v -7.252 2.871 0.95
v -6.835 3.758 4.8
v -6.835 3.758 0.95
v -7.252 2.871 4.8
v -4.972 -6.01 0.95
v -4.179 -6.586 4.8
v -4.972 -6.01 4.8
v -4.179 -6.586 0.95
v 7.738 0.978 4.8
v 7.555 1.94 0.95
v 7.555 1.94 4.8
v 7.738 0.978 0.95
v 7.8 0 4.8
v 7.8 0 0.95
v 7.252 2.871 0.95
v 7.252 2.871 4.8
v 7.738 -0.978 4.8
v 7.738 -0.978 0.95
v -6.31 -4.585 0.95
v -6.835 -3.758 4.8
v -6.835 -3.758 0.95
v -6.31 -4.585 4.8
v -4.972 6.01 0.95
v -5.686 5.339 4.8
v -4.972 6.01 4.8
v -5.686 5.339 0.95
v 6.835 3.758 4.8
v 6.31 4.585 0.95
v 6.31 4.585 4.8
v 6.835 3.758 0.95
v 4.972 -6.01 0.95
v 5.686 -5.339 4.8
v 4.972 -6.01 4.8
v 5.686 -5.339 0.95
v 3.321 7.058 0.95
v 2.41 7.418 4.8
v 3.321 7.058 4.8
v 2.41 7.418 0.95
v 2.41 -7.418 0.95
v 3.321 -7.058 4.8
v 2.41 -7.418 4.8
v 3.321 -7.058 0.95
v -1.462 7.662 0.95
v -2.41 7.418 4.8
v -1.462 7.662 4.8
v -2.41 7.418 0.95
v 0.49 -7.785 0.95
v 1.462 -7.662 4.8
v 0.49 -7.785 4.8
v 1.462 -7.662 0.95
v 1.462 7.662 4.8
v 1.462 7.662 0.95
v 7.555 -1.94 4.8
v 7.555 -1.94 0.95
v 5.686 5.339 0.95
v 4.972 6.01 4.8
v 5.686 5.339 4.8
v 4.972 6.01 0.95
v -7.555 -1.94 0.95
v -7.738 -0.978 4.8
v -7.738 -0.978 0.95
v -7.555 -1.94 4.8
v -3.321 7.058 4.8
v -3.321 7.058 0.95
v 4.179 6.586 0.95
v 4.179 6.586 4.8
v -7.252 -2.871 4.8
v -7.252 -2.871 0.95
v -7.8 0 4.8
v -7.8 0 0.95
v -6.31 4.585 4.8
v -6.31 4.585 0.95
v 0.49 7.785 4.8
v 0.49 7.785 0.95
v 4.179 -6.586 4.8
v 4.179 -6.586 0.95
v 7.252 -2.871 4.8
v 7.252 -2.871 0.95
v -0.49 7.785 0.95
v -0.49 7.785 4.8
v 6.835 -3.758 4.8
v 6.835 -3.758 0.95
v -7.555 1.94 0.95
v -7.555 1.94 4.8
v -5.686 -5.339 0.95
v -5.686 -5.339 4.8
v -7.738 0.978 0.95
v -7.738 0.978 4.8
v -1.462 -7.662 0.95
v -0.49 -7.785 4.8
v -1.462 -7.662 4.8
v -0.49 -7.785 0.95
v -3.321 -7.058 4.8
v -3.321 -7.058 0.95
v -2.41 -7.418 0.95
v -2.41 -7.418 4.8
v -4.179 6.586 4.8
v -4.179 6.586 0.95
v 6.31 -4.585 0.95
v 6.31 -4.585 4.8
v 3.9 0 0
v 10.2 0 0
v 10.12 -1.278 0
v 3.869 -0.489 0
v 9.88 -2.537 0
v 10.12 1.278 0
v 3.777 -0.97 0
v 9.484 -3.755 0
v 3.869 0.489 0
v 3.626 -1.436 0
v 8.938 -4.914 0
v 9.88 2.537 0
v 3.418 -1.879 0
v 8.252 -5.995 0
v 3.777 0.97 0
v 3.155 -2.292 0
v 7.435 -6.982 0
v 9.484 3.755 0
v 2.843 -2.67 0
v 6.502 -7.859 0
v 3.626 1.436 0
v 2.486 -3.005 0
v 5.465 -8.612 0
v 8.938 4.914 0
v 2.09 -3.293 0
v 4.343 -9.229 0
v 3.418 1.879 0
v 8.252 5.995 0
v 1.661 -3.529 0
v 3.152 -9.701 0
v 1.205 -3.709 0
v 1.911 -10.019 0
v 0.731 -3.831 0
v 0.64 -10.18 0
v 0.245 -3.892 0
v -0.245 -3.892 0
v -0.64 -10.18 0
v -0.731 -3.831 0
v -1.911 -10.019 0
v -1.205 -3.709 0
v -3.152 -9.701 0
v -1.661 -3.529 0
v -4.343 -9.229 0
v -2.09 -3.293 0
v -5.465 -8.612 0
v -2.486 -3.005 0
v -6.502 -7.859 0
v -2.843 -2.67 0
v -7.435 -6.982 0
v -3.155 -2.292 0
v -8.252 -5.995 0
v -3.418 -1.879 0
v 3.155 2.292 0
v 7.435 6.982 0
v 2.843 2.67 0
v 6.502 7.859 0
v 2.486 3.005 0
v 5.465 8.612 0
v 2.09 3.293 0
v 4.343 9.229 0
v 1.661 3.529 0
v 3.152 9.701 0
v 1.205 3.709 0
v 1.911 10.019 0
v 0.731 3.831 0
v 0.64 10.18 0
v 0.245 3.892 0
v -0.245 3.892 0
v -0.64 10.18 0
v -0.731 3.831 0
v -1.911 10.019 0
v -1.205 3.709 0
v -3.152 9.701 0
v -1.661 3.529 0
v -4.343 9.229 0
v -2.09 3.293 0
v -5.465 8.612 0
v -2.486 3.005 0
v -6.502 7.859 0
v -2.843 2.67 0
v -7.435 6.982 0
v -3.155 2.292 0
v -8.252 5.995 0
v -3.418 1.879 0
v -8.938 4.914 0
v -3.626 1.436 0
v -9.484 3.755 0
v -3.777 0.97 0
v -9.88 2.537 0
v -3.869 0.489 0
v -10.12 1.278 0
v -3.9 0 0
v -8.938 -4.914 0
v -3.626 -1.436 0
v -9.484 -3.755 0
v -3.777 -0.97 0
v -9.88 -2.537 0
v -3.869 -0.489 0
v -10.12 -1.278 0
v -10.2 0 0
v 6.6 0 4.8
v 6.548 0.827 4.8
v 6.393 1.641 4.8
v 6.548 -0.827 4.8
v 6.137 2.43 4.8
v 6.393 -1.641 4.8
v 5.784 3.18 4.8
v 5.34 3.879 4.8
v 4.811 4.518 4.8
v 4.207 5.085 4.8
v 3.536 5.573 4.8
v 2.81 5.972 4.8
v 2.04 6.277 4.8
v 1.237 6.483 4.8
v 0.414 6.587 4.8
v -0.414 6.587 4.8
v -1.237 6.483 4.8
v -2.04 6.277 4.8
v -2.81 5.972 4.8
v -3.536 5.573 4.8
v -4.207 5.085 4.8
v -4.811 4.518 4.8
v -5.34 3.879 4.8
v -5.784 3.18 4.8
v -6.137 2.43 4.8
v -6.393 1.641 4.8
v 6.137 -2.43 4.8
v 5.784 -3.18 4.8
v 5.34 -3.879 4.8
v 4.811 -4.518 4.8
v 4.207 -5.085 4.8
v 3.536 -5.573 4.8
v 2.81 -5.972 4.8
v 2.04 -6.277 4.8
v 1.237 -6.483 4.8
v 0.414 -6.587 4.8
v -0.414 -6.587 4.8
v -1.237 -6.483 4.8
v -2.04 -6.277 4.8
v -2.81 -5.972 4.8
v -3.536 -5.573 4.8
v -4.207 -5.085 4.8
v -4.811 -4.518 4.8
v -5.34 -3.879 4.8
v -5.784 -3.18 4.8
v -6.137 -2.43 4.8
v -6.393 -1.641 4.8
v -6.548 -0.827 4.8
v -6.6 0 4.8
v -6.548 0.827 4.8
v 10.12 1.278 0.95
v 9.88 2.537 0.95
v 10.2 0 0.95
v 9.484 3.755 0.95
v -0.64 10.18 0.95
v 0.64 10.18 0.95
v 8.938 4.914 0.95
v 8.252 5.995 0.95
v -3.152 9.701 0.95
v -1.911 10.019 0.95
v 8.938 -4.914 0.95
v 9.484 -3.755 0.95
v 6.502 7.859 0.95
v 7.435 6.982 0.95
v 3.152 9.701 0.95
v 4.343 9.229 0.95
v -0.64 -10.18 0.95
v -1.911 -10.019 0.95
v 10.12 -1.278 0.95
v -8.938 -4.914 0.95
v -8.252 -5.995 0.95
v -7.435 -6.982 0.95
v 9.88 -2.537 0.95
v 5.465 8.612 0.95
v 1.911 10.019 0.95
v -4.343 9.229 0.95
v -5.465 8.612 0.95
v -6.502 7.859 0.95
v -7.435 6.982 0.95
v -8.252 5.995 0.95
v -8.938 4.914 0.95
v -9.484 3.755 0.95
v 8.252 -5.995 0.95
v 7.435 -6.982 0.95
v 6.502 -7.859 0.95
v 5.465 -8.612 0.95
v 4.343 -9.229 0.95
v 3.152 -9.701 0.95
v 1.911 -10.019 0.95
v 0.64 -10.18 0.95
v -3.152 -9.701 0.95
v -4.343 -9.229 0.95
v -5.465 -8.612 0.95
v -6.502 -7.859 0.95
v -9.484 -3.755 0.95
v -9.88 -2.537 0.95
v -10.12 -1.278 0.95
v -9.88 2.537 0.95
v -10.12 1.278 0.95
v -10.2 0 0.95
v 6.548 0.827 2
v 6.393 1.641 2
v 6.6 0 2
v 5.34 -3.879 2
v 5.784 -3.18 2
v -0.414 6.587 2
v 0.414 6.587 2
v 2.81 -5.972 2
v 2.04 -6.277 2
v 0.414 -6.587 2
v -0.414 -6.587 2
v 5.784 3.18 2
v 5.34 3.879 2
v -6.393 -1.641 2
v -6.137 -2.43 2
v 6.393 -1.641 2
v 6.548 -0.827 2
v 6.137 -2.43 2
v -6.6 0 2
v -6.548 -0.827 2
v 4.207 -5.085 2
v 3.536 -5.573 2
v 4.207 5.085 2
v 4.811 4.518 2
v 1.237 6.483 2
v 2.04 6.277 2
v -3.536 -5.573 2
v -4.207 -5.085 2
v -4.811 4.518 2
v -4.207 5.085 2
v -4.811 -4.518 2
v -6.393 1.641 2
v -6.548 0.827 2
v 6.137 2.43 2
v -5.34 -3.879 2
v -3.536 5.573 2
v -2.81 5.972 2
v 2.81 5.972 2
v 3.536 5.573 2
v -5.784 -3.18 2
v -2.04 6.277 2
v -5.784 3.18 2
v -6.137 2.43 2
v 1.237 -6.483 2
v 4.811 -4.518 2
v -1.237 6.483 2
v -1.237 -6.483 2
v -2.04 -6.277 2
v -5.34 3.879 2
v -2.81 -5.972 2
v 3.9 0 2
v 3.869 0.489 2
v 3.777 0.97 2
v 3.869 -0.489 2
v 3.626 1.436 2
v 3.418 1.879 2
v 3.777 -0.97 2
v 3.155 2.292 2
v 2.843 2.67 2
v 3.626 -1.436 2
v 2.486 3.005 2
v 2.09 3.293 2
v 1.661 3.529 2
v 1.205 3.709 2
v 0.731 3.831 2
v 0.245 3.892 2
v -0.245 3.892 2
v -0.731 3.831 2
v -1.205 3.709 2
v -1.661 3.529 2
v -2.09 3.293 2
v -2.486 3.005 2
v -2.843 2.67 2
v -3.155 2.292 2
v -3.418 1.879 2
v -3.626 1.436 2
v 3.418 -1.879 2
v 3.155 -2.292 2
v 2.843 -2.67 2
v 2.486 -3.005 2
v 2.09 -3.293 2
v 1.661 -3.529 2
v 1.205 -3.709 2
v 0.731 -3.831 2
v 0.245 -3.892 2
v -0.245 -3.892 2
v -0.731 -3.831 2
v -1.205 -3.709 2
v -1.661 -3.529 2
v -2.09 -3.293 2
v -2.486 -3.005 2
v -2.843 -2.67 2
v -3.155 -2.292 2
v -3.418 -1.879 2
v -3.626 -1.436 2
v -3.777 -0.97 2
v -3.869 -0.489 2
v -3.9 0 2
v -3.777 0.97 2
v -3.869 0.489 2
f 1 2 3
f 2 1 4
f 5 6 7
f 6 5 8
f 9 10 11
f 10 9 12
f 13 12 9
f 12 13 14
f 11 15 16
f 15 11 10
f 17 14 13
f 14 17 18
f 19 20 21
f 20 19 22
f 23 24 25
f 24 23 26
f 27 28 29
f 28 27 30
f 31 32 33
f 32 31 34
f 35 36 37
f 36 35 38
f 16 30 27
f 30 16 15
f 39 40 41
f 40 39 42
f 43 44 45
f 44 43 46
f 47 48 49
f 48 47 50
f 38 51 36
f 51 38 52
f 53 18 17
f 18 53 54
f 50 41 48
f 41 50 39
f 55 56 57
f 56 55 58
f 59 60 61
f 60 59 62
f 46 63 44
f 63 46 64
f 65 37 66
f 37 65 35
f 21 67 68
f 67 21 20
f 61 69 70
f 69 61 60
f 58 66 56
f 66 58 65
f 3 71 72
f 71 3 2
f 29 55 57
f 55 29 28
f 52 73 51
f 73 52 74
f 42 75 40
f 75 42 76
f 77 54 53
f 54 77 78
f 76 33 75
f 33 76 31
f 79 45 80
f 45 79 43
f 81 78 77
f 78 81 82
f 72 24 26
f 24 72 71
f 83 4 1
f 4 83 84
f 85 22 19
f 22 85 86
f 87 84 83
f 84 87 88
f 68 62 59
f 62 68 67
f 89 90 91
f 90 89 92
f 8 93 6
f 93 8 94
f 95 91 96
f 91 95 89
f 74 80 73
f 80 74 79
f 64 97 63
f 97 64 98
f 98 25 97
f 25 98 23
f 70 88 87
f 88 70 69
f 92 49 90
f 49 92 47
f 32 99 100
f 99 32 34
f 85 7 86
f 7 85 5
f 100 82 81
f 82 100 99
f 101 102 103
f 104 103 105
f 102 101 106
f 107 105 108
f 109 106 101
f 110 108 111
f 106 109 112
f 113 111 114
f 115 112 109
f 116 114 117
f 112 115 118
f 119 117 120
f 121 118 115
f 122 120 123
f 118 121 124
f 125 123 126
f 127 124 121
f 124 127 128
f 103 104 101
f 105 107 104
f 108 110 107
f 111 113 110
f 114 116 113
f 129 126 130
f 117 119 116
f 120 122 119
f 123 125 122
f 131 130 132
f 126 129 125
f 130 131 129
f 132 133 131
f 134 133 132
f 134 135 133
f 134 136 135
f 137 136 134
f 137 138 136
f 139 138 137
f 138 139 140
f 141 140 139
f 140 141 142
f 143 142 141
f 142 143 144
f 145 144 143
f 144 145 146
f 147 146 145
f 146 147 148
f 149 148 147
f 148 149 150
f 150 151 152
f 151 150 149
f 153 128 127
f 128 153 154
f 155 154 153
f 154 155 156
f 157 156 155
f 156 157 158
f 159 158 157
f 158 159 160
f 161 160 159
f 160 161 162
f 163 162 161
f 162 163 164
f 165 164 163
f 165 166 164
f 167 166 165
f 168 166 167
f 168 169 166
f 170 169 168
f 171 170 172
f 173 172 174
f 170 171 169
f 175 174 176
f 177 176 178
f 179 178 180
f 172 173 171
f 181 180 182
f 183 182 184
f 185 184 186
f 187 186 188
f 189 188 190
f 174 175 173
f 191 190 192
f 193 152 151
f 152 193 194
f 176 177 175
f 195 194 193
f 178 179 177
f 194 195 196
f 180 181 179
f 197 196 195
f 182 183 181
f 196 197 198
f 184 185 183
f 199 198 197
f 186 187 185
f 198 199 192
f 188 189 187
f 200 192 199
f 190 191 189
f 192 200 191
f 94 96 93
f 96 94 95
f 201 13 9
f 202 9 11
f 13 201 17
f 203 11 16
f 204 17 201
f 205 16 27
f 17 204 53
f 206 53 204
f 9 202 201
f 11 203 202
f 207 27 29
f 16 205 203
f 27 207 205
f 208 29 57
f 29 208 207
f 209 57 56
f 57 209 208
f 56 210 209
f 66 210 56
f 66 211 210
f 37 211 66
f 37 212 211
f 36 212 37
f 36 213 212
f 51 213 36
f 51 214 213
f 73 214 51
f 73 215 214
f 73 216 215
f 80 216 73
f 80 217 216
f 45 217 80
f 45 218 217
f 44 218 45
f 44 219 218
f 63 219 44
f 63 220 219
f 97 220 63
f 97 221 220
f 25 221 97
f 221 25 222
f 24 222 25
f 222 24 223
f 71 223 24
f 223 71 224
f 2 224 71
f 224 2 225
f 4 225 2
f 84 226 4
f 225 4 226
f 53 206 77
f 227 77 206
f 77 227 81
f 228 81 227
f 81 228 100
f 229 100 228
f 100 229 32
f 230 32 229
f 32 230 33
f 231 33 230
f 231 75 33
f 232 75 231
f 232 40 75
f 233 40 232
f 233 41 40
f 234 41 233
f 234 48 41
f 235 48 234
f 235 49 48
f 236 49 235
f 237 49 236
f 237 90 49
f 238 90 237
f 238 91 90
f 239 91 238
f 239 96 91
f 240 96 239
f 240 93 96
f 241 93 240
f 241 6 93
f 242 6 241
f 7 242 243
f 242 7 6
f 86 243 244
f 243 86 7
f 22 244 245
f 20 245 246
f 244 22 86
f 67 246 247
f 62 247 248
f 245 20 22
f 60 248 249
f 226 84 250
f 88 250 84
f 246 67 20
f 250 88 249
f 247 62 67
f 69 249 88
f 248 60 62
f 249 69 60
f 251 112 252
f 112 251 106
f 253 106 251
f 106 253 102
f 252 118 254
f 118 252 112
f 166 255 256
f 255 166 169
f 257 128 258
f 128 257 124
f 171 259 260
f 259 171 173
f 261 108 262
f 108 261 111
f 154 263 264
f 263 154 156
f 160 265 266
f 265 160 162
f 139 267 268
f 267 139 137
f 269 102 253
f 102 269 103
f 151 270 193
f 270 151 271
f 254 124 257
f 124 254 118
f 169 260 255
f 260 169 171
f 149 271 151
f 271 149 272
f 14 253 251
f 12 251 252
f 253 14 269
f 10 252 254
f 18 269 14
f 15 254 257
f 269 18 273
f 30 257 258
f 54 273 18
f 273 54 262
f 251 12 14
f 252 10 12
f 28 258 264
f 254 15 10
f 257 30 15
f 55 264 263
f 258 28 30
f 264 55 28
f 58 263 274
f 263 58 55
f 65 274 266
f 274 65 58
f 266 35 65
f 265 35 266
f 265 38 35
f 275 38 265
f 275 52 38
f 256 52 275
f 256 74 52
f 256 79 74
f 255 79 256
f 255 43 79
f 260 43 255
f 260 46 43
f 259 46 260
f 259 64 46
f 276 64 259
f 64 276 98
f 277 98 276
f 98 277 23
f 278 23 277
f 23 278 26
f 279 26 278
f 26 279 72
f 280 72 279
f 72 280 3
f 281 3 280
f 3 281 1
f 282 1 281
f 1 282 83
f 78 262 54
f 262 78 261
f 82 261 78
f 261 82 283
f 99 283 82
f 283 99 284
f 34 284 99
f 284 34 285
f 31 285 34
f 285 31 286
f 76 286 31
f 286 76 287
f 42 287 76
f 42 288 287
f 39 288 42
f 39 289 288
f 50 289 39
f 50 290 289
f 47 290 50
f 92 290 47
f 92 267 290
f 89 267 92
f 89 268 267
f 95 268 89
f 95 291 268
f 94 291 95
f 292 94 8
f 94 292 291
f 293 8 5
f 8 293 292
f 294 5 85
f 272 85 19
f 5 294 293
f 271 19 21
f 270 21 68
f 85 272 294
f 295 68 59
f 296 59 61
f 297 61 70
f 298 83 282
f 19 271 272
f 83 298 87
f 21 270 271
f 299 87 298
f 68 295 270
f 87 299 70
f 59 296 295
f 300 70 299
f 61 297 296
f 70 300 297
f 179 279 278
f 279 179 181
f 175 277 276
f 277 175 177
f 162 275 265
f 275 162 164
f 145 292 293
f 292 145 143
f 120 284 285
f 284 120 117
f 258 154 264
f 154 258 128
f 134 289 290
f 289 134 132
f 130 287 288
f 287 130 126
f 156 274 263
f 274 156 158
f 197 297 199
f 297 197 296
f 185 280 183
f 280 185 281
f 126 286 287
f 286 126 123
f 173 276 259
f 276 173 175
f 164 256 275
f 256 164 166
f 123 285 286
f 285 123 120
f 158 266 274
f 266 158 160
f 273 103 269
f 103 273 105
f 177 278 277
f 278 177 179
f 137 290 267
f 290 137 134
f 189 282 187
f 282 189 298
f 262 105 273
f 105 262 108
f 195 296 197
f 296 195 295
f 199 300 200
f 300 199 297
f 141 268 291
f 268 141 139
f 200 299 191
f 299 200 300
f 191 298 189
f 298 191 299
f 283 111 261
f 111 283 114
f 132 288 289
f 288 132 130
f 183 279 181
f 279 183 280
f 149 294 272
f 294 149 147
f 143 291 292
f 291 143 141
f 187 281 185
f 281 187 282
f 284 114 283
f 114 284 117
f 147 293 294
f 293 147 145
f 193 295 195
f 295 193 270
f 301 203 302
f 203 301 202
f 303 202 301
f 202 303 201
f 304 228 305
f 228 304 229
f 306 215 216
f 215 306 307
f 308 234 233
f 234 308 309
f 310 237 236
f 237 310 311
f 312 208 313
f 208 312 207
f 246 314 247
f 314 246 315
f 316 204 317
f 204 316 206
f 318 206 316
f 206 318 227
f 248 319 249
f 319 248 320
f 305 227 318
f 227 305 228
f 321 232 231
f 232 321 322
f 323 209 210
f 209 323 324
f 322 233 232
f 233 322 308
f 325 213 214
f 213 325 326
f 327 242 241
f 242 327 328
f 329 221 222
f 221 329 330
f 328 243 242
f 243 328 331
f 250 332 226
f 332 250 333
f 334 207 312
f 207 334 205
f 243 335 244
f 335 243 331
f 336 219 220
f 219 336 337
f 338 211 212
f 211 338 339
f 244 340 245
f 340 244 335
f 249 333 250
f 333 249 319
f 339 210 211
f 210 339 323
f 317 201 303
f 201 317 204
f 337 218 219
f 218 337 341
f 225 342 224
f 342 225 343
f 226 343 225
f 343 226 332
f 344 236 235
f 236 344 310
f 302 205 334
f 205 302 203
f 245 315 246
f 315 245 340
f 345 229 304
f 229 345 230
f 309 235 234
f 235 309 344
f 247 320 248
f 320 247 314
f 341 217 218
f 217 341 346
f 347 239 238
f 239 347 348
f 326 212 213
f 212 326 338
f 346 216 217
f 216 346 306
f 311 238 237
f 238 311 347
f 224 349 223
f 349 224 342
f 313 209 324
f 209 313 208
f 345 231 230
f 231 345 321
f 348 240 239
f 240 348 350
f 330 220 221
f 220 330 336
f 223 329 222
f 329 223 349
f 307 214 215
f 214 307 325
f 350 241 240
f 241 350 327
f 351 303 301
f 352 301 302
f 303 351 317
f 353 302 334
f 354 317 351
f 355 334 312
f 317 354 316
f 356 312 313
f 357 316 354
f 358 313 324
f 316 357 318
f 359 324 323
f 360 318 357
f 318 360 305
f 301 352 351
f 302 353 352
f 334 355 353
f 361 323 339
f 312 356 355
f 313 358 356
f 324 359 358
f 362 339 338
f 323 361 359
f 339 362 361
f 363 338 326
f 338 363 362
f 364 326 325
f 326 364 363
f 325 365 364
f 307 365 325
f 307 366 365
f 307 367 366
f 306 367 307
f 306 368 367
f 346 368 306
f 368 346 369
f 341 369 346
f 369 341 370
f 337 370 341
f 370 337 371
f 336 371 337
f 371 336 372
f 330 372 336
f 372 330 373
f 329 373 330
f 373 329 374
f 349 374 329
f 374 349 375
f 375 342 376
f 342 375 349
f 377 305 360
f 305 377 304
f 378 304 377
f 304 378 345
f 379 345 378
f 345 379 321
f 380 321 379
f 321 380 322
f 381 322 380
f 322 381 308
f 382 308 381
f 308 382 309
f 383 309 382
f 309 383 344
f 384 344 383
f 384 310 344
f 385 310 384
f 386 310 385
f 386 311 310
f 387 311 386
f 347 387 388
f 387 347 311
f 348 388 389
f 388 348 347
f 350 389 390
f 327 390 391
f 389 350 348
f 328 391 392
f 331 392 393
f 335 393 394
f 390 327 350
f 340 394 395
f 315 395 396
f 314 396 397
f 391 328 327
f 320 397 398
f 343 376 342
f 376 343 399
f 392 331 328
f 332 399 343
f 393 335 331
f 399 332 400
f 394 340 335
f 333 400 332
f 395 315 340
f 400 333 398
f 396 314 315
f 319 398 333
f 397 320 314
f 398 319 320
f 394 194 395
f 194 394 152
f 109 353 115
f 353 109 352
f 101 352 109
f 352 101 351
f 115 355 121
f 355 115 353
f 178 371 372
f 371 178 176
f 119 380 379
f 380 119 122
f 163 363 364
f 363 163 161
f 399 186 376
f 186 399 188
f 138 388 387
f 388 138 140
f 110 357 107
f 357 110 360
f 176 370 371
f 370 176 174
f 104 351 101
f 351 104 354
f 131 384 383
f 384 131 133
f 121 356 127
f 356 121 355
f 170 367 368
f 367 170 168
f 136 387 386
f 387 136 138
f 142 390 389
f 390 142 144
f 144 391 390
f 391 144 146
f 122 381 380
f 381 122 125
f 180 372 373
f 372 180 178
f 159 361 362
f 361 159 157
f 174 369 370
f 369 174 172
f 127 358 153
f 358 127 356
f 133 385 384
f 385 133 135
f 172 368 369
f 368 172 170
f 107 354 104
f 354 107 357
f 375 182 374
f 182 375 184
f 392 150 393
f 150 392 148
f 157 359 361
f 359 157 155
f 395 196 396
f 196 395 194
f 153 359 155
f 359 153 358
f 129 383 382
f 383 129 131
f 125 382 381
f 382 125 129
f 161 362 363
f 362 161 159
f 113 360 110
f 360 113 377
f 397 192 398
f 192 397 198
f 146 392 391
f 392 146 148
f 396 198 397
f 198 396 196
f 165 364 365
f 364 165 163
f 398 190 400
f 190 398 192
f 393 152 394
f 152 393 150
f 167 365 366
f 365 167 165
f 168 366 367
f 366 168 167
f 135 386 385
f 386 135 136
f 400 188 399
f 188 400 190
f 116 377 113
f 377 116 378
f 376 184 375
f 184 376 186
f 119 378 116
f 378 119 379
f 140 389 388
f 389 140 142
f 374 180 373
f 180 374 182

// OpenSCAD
// PRUSA iteration3
// 624 bearing belt guide
// GNU GPL v3
// Josef Průša <iam@josefprusa.cz> and contributors
// http://www.reprap.org/wiki/Prusa_Mendel
// http://prusamendel.org

wall= 1.2;
clearence= 0.1; 

module belt_guide_base(){
 cylinder(r=6.5+wall+clearence, h=5-0.2, $fn=50);
 cylinder(r=6.5+wall+clearence+2*wall, h=0.95, $fn=50);
}

module belt_guide_holes(){
 translate([0,0,2]) cylinder(r=6.5+clearence, h=10, $fn=50);
 translate([0,0,-1]) cylinder(r=5+wall+clearence-2*wall, h=10, $fn=50);
}

// Final part
module belt_guide(){
 difference(){
  belt_guide_base();
  belt_guide_holes();
 }
}

belt_guide();
